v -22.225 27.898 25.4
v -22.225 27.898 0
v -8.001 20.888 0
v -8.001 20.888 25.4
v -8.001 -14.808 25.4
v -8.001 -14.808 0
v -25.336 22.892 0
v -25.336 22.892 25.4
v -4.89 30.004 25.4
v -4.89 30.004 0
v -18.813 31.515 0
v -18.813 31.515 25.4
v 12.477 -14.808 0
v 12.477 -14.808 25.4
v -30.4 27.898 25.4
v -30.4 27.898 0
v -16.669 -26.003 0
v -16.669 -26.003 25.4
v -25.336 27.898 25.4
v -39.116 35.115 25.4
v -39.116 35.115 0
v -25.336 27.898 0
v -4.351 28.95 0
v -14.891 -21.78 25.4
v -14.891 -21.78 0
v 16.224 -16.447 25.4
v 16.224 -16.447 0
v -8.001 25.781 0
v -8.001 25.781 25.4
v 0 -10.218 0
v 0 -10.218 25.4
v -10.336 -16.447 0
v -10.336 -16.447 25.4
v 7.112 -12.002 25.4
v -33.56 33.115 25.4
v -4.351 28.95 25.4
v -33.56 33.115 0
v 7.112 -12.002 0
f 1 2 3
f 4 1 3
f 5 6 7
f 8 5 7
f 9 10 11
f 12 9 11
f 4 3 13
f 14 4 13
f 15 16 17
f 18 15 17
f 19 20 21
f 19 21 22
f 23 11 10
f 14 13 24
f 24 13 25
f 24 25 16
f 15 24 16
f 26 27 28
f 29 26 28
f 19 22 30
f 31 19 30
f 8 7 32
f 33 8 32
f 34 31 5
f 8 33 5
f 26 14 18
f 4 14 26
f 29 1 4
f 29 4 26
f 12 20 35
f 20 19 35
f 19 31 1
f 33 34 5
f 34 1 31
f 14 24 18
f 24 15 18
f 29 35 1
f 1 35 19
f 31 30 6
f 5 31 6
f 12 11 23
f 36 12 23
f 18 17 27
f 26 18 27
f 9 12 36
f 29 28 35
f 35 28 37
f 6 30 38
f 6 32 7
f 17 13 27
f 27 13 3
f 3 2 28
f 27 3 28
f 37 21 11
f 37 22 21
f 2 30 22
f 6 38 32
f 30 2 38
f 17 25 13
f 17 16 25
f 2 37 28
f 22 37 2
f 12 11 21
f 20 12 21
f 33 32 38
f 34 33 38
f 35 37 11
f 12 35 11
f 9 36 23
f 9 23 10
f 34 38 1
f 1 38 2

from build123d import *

# Parameters (mm, degrees)
F1_DEPTH = 25.4


with BuildPart() as f1:
    # F0 (on Top) → F1 (new body)
    with BuildSketch(Plane.XY):
        Polygon((-18.813158, 31.514846), (-4.350921, 28.950009), (-4.8895, 30.003751), align=None)
        Polygon((-33.559751, 33.115253), (-18.813158, 31.514846), (-39.115999, 35.115499), (-25.3365, 27.89825), (0, -10.218336), (-8.001, -14.808383), (-25.3365, 22.891751), (-10.336284, -16.446501), (7.112001, -12.0015), (-22.225, 27.89825), (-8.001, 20.887932), (12.477411, -14.808383), (-14.89075, -21.7805), (-30.400311, 27.89825), (-16.66875, -26.003249), (16.22425, -16.446501), (-8.001, 25.781002), align=None)
    extrude(amount=F1_DEPTH)


solid = f1.part
